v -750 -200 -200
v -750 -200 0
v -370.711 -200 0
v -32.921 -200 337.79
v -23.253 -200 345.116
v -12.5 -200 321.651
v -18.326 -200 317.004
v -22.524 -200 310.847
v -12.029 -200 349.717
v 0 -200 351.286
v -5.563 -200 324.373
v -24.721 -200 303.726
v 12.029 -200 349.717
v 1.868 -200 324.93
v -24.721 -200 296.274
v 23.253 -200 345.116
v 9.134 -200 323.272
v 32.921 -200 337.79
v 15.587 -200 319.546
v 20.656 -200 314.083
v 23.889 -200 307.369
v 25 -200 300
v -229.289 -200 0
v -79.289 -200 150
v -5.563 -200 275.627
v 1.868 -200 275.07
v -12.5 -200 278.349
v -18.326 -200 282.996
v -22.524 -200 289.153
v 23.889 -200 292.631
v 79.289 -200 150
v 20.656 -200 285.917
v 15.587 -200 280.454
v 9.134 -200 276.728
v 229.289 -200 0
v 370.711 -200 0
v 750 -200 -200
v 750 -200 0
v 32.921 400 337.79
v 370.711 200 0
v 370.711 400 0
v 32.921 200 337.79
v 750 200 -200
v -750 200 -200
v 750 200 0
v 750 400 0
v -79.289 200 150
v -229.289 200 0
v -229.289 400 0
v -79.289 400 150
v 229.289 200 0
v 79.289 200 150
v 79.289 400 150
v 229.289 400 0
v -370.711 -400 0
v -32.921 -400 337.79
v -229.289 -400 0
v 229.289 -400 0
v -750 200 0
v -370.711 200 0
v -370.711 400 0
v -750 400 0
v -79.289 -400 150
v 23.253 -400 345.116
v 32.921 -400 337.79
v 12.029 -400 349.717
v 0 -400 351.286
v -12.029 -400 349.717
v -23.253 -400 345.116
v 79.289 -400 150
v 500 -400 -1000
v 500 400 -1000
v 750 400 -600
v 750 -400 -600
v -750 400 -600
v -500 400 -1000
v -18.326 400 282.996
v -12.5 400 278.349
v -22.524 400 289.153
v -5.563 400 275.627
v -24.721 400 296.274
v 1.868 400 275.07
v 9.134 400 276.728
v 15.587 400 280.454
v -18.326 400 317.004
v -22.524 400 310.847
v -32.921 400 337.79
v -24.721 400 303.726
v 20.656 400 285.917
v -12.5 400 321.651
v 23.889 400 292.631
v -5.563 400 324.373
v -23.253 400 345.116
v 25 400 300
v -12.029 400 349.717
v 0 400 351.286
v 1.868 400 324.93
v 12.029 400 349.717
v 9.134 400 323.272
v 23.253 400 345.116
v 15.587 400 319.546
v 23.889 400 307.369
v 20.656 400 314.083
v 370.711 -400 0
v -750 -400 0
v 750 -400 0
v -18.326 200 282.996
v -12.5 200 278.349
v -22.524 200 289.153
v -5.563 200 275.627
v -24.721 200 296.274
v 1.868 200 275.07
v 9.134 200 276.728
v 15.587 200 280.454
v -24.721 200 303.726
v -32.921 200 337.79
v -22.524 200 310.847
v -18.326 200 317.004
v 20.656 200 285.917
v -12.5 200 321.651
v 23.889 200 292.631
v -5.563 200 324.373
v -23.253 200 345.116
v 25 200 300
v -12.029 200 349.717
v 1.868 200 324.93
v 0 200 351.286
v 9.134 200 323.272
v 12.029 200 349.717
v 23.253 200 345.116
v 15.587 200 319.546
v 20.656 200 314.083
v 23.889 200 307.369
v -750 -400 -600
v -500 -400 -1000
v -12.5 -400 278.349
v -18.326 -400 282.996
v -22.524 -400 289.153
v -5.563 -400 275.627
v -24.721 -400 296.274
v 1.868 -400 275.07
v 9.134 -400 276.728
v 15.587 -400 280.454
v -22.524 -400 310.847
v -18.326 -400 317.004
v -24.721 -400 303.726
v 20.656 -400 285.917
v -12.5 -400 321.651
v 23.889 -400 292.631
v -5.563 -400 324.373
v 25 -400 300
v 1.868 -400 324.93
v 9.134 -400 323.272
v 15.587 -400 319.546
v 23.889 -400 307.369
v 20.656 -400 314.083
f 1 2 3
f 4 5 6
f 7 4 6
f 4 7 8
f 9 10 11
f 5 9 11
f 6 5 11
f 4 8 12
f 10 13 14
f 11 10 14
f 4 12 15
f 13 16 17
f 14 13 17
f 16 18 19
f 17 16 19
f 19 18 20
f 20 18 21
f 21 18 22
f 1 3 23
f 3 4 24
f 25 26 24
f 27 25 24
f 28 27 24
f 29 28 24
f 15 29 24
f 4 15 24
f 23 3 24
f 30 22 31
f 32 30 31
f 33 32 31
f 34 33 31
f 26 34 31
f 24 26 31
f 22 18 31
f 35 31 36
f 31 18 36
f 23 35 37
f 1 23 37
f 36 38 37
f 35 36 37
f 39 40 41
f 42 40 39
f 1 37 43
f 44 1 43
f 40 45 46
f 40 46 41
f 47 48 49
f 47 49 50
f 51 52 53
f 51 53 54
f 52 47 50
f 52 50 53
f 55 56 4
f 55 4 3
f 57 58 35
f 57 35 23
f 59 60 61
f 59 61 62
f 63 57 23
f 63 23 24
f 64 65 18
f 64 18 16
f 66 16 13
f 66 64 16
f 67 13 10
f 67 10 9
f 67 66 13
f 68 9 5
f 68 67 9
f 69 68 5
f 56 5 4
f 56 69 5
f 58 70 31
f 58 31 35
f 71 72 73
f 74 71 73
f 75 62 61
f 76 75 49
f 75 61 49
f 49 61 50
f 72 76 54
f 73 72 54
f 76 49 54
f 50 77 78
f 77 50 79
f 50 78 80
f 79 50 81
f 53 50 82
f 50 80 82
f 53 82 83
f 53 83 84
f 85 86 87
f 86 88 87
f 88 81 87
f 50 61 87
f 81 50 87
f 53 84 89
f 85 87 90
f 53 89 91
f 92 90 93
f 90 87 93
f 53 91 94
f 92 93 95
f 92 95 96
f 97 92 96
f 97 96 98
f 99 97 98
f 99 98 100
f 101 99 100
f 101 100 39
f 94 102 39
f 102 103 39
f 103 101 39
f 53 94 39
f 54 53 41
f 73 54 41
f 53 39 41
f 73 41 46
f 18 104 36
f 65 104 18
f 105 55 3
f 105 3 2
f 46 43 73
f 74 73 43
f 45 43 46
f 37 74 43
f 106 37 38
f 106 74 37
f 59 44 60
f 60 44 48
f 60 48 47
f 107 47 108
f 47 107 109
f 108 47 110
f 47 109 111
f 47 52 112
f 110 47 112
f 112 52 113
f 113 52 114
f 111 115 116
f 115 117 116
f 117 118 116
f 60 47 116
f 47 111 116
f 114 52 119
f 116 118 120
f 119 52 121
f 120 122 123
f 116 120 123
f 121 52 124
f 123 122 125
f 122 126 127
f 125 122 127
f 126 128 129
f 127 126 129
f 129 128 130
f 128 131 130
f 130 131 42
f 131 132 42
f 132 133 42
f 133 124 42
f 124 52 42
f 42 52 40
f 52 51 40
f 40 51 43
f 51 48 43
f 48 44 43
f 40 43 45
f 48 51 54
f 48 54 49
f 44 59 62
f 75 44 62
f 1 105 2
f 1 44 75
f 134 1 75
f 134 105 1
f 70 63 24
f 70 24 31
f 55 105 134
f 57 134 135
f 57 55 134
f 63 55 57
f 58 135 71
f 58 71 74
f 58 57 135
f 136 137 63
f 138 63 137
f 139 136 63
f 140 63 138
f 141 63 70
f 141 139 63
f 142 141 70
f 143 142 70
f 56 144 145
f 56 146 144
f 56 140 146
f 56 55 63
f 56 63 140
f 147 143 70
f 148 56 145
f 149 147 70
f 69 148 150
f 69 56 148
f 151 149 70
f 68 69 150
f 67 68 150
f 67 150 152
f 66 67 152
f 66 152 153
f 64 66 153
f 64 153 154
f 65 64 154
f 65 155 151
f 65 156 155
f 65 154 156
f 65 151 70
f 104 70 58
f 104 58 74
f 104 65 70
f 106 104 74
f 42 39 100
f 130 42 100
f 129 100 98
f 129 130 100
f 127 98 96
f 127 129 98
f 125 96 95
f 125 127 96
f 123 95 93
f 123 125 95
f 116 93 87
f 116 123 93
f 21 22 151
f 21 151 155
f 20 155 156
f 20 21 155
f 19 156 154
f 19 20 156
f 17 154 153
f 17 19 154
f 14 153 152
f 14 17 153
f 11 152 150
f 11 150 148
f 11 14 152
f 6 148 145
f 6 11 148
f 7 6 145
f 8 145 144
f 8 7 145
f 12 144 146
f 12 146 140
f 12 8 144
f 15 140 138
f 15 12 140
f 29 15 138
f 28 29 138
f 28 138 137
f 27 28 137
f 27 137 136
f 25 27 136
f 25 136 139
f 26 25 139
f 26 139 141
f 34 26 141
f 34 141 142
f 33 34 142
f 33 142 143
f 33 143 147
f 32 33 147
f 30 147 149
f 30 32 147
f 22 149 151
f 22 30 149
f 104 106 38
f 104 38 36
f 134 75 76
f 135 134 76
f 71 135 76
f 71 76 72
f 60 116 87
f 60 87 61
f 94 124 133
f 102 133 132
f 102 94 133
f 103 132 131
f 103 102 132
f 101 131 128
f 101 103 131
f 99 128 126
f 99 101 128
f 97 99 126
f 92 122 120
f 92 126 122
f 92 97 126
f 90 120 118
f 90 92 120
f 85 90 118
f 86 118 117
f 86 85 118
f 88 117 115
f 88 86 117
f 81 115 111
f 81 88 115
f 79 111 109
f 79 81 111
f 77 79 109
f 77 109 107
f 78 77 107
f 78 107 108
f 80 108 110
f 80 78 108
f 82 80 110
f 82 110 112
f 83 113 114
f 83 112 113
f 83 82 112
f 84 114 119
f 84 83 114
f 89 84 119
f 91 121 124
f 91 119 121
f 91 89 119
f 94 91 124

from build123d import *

# Parameters (mm, degrees)
F1_DEPTH = 400
F2_R     = 25
F3_DEPTH = 400
F5_DEPTH = 1500


with BuildPart() as f1:
    # F0 (on Front) → F1 (new body, symmetric)
    with BuildSketch(Plane.XZ):
        Polygon((750, 0), (-750, 0), (-750, -600), (-500, -1000), (500, -1000), (750, -600), align=None)
    extrude(amount=F1_DEPTH, both=True)

    # F2 (on Front) → F3 (join, symmetric)
    with BuildSketch(Plane.XZ):
        with BuildLine():
            Line((-32.921014, 337.789664), (-455.401369, -84.690691))
            ThreePointArc((-455.401369, -84.690691), (-460.755214, -158.795816), (-386.474404, -157.185082))
            Line((-386.474404, -157.185082), (-79.289322, 150))
            Line((-79.289322, 150), (0, 150))
            Line((0, 150), (79.289322, 150))
            Line((79.289322, 150), (386.474404, -157.185082))
            ThreePointArc((386.474404, -157.185082), (460.755214, -158.795816), (455.401369, -84.690691))
            Line((455.401369, -84.690691), (32.921014, 337.789664))
            ThreePointArc((32.921014, 337.789664), (0, 351.28622), (-32.921014, 337.789664))
        make_face()
        with Locations((0, 300)):
            Circle(F2_R, mode=Mode.SUBTRACT)
    extrude(amount=F3_DEPTH, both=True)

    # F4 (on face) → F5 (cut)
    with BuildSketch(Plane.YZ.offset(750)):
        Polygon((200, 500), (-200, 500), (-200, 0), (-200, -200), (200, -200), (200, 0), align=None)
    extrude(amount=-F5_DEPTH, mode=Mode.SUBTRACT)


solid = f1.part
